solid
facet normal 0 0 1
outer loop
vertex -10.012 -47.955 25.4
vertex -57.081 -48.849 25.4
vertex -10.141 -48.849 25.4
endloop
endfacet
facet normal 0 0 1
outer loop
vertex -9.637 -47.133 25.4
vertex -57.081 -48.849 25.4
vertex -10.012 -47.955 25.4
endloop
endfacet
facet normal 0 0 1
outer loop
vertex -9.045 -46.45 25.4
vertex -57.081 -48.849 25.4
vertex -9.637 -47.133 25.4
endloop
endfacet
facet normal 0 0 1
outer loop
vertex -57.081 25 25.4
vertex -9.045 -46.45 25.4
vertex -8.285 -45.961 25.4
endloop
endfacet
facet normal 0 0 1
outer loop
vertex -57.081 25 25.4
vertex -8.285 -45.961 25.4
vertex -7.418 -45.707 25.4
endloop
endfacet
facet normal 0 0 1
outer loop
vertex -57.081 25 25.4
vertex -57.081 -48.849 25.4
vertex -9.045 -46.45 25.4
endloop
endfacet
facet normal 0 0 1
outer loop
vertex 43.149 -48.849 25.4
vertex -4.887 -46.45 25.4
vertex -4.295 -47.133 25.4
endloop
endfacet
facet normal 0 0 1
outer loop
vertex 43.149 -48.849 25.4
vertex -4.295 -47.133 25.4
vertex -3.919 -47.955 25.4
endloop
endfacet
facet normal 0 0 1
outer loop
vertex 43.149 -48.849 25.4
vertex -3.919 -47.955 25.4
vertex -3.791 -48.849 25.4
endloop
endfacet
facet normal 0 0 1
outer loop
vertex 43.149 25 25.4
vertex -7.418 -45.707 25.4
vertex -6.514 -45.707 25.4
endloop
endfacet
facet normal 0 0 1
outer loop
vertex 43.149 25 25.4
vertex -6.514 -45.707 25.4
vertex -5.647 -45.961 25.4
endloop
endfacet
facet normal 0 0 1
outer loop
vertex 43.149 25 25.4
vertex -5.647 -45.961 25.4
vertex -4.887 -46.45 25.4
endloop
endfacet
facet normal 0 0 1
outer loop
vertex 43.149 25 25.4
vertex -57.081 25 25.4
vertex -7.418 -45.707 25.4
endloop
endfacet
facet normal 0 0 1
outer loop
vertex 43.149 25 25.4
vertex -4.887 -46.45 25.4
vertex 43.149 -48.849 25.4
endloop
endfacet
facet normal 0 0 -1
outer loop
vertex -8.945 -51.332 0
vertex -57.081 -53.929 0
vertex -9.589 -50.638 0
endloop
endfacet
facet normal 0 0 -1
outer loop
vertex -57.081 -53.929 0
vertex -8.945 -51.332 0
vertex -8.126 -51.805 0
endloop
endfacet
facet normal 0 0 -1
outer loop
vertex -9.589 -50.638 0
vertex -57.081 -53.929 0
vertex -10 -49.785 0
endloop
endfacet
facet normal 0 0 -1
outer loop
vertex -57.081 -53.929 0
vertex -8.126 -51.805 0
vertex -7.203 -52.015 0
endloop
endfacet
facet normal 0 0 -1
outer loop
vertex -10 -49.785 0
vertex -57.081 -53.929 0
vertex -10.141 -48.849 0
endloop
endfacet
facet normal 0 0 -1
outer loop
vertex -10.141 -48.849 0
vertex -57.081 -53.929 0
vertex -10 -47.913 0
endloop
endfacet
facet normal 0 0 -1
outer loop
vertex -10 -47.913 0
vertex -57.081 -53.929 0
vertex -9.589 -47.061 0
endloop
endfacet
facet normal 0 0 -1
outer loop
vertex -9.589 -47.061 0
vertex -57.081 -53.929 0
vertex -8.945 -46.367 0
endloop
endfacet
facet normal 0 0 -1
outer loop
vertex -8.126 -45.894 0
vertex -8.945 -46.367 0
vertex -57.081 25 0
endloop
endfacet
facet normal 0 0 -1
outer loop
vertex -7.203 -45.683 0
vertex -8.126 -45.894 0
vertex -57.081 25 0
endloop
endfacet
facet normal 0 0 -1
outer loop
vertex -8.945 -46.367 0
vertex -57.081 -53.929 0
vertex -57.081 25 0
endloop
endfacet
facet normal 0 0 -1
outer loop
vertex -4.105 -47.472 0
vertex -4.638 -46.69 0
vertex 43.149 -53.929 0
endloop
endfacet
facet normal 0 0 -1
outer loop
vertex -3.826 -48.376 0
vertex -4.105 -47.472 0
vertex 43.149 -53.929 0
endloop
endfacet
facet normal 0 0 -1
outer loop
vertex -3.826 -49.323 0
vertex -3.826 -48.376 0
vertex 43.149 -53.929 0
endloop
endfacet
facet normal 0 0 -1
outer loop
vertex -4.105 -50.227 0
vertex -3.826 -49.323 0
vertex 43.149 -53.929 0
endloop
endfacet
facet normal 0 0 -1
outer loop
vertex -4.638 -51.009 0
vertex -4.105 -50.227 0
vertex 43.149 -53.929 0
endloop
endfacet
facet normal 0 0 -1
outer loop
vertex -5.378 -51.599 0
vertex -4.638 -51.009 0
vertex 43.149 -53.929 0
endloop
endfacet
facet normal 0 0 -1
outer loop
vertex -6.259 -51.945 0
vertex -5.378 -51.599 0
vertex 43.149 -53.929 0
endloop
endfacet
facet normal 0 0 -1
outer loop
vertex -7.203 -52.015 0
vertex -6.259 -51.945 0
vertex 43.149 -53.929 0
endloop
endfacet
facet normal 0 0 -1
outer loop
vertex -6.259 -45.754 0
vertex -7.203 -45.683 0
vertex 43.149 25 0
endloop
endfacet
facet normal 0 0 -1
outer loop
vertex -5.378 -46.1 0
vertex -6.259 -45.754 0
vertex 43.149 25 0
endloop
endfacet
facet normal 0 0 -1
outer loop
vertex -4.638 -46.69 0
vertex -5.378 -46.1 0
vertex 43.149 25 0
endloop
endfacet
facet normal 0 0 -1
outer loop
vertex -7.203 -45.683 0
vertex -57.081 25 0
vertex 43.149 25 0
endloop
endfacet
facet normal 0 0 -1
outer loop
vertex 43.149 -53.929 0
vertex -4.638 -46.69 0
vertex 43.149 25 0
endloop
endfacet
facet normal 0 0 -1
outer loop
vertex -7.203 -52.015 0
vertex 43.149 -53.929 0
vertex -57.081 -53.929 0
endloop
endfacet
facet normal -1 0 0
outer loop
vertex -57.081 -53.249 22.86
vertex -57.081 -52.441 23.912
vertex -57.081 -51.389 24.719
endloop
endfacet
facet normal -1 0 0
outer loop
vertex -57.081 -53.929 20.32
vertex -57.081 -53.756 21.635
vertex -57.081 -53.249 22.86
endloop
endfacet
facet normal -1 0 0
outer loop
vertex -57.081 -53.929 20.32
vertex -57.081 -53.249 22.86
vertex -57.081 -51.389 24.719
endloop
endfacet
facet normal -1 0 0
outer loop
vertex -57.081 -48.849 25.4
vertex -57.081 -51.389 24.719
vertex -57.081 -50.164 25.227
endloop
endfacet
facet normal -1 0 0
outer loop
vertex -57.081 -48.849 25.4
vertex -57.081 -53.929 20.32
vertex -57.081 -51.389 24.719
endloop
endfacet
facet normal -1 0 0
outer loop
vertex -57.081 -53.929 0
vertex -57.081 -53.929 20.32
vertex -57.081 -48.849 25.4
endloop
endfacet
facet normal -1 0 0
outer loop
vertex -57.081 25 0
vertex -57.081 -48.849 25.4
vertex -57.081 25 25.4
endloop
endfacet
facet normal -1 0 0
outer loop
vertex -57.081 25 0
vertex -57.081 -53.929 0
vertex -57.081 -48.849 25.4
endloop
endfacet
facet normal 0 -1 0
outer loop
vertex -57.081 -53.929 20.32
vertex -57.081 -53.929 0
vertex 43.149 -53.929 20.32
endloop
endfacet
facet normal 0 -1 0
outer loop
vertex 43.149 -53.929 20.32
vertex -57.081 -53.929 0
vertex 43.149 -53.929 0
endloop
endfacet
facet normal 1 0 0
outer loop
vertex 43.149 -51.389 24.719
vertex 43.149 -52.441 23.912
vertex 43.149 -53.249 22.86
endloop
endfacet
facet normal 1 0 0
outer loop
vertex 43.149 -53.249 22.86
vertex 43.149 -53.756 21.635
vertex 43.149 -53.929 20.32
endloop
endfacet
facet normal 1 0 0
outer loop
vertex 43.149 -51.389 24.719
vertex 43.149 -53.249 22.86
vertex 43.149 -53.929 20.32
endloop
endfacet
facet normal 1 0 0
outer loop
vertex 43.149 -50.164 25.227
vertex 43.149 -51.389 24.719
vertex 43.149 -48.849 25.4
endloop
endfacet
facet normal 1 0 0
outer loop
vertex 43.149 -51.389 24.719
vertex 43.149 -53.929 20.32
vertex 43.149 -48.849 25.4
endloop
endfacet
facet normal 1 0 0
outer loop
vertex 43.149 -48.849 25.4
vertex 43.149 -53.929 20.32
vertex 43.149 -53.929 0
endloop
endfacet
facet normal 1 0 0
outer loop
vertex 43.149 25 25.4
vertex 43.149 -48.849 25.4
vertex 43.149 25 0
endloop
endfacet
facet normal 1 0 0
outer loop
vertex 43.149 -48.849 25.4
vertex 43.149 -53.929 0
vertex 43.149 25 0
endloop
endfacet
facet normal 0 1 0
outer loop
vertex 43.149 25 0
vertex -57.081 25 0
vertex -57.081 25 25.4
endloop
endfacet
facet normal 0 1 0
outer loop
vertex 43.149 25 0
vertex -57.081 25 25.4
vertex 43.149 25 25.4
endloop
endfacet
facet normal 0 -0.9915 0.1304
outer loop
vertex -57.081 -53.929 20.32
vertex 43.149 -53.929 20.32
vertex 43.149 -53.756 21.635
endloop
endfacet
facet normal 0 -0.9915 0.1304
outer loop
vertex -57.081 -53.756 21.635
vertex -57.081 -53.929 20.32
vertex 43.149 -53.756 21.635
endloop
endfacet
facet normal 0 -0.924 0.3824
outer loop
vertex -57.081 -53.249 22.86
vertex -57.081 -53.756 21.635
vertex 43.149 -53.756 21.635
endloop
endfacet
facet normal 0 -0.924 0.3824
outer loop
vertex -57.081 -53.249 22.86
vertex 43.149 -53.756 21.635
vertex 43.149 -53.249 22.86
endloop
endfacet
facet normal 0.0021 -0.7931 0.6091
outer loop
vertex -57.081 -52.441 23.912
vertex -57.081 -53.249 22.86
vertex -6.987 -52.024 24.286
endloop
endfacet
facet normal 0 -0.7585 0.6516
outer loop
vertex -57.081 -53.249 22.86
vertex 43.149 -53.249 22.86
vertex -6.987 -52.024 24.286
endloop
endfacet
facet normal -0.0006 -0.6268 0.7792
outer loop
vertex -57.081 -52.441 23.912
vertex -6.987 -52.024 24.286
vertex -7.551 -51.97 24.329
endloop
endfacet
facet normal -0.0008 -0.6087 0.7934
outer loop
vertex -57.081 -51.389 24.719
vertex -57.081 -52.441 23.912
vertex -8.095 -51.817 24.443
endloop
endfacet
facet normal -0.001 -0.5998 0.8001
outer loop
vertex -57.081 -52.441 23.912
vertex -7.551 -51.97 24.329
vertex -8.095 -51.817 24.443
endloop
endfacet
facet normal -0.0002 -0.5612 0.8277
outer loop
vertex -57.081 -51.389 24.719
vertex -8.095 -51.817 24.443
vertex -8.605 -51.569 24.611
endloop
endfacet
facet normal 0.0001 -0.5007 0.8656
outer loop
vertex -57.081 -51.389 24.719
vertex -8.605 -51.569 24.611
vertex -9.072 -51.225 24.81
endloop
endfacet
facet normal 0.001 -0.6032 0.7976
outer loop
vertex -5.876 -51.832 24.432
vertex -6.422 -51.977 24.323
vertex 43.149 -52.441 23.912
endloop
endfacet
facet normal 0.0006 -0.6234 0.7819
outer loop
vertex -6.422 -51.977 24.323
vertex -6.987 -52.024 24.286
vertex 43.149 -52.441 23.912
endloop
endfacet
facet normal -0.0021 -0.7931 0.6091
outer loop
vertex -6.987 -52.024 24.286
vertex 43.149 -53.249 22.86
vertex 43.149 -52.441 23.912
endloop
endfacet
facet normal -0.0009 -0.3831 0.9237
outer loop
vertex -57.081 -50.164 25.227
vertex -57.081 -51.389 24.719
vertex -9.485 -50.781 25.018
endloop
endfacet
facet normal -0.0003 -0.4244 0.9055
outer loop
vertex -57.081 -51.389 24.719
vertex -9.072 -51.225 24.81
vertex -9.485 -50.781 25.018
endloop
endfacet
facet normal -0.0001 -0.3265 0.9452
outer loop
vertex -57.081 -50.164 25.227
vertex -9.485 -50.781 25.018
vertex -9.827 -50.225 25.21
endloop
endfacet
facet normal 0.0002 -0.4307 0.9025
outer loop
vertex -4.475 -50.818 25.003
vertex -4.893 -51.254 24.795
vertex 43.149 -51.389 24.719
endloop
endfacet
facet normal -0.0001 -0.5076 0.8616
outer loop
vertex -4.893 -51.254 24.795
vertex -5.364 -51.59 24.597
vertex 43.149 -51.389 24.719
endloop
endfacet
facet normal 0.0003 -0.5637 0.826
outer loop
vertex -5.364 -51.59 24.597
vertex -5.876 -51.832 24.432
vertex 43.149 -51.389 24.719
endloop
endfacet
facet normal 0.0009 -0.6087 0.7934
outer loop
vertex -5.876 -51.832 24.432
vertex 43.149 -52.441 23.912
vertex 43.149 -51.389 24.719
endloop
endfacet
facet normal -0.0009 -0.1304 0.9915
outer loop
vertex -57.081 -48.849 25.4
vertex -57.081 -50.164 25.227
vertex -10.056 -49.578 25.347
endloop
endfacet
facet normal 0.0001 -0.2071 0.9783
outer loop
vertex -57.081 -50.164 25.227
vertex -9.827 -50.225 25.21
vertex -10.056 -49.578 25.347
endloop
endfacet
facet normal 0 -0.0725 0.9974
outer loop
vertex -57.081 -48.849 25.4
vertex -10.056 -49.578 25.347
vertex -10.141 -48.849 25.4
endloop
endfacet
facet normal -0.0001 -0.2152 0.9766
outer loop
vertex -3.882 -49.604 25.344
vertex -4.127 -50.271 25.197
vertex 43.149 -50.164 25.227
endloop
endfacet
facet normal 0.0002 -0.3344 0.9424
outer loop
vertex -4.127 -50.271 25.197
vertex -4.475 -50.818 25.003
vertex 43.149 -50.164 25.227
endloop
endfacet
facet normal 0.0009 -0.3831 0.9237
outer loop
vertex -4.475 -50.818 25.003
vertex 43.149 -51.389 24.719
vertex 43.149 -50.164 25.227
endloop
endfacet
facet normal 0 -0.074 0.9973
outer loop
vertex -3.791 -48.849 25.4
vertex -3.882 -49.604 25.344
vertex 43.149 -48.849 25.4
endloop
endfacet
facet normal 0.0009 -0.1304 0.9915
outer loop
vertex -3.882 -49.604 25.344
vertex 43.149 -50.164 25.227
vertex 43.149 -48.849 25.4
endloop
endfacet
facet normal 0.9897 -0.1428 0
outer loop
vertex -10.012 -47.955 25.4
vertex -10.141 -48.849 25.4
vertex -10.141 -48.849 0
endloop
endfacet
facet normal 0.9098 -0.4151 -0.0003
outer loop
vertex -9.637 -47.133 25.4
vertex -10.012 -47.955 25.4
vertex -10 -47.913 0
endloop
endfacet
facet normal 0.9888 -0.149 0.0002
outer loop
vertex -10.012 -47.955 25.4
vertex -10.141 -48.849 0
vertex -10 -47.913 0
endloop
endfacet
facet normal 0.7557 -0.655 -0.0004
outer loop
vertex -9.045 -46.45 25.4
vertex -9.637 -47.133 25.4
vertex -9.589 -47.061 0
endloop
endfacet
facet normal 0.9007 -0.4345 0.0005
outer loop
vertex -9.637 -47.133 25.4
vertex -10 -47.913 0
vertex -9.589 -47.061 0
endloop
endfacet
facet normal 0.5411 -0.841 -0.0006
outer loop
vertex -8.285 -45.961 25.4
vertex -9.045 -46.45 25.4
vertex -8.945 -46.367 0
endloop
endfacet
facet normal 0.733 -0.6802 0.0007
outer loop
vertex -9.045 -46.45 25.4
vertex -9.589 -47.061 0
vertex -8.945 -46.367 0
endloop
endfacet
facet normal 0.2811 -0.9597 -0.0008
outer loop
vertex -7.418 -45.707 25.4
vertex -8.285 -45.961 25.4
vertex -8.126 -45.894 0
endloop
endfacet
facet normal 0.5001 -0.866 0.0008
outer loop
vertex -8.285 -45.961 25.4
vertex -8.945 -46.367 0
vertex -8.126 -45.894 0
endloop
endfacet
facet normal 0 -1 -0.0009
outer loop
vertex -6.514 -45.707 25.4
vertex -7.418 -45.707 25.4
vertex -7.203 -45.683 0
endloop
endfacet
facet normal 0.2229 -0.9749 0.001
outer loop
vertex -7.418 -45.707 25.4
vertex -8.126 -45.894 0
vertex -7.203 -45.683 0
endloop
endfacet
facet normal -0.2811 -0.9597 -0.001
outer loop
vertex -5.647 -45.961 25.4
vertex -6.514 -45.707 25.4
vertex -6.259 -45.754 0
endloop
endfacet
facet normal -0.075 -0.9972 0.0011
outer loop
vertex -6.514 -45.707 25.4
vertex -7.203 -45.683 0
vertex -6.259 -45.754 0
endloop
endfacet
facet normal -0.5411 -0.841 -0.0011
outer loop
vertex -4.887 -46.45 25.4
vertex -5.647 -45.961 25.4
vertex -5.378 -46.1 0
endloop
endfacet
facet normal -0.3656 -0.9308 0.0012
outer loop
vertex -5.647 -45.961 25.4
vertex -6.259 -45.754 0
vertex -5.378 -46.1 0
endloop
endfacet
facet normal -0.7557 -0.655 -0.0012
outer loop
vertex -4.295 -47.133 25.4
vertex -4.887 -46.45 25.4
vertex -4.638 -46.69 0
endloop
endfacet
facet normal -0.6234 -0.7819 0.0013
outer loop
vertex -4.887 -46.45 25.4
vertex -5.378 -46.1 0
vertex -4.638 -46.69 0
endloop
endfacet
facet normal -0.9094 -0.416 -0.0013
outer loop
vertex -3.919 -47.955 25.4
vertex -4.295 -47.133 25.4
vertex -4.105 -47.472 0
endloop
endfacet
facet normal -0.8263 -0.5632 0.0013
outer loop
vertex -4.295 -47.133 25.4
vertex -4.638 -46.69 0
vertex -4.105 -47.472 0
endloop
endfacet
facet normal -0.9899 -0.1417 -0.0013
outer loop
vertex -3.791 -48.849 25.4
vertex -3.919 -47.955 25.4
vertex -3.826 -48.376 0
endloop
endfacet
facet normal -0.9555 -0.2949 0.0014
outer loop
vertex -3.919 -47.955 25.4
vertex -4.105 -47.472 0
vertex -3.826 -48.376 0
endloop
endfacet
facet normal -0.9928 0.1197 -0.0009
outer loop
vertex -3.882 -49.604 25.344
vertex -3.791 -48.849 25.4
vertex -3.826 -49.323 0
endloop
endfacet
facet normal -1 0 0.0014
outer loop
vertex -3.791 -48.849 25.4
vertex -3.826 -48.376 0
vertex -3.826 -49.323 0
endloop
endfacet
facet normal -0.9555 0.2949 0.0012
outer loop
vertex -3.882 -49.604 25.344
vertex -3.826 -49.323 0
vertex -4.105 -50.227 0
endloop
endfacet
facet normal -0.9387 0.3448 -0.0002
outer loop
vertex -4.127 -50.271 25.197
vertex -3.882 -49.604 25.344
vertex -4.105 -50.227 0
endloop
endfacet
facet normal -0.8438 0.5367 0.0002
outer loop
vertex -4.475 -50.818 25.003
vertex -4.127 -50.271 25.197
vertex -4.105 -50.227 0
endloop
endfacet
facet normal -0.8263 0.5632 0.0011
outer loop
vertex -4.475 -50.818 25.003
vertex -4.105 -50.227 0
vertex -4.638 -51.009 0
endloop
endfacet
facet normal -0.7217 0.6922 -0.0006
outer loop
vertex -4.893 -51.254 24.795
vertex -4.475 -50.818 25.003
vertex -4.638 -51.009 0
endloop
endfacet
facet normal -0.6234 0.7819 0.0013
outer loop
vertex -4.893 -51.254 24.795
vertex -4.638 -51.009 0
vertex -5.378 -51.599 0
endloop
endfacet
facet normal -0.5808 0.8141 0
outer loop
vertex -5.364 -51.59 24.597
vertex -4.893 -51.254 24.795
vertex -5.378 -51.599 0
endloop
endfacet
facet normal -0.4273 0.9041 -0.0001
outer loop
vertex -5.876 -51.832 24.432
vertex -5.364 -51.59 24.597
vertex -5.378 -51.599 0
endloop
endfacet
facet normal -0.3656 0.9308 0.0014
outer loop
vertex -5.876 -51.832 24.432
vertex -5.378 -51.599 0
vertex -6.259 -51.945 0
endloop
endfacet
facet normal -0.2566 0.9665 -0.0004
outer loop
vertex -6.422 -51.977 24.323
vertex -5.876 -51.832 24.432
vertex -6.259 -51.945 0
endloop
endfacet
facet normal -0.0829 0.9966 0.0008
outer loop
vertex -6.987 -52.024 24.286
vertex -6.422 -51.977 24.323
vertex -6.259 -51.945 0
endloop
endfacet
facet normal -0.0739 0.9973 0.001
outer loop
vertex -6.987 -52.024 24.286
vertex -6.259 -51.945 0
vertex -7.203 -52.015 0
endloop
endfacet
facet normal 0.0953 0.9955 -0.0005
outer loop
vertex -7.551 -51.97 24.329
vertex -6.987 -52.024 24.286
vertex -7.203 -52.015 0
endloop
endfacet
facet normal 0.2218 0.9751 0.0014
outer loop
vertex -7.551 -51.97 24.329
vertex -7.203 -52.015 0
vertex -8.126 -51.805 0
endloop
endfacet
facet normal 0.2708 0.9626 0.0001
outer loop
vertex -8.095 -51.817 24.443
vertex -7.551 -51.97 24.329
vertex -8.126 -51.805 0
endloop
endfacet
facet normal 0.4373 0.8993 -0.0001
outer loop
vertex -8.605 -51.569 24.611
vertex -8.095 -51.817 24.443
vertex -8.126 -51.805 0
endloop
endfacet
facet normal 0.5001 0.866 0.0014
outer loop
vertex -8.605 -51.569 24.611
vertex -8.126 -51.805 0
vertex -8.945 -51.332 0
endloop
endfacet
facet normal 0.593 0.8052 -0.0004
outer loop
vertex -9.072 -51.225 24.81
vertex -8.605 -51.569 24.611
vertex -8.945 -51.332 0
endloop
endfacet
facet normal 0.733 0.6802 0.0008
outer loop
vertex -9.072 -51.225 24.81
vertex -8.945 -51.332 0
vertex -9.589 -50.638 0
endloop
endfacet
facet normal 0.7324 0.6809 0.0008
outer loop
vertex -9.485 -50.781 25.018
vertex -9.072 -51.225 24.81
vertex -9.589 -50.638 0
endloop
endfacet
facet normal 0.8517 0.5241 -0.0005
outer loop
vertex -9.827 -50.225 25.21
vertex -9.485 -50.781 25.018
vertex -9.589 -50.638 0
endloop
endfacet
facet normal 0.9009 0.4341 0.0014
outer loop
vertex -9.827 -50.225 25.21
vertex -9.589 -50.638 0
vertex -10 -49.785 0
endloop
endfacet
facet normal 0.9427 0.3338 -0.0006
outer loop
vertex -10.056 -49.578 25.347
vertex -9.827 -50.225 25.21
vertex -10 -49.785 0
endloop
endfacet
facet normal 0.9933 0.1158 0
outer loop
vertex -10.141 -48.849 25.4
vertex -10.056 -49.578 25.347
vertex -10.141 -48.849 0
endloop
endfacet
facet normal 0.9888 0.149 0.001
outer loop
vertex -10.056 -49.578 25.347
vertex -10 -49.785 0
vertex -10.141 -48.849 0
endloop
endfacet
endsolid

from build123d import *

# Parameters (mm, degrees)
F0_W     = 100.230019
F0_H     = 78.929061
F1_DEPTH = 25.4
F2_R     = 5.08
F5_D     = 6.35


with BuildPart() as f1:
    # F0 (on Top) → F1 (new body)
    with BuildSketch(Plane.XY):
        with Locations((-6.965729, -14.46478)):
            Rectangle(F0_W, F0_H)
    extrude(amount=F1_DEPTH)

    # F2
    f2_edges = [f1.edges().sort_by_distance(p)[0] for p in [
        (-6.965728, -53.92931, 25.4),
    ]]
    fillet(f2_edges, radius=F2_R)

    # F5 (through all)
    with Locations(Plane.XY.offset(25.4)):
        with Locations((-6.965728, -48.84931)):
            Hole(F5_D / 2)


solid = f1.part
